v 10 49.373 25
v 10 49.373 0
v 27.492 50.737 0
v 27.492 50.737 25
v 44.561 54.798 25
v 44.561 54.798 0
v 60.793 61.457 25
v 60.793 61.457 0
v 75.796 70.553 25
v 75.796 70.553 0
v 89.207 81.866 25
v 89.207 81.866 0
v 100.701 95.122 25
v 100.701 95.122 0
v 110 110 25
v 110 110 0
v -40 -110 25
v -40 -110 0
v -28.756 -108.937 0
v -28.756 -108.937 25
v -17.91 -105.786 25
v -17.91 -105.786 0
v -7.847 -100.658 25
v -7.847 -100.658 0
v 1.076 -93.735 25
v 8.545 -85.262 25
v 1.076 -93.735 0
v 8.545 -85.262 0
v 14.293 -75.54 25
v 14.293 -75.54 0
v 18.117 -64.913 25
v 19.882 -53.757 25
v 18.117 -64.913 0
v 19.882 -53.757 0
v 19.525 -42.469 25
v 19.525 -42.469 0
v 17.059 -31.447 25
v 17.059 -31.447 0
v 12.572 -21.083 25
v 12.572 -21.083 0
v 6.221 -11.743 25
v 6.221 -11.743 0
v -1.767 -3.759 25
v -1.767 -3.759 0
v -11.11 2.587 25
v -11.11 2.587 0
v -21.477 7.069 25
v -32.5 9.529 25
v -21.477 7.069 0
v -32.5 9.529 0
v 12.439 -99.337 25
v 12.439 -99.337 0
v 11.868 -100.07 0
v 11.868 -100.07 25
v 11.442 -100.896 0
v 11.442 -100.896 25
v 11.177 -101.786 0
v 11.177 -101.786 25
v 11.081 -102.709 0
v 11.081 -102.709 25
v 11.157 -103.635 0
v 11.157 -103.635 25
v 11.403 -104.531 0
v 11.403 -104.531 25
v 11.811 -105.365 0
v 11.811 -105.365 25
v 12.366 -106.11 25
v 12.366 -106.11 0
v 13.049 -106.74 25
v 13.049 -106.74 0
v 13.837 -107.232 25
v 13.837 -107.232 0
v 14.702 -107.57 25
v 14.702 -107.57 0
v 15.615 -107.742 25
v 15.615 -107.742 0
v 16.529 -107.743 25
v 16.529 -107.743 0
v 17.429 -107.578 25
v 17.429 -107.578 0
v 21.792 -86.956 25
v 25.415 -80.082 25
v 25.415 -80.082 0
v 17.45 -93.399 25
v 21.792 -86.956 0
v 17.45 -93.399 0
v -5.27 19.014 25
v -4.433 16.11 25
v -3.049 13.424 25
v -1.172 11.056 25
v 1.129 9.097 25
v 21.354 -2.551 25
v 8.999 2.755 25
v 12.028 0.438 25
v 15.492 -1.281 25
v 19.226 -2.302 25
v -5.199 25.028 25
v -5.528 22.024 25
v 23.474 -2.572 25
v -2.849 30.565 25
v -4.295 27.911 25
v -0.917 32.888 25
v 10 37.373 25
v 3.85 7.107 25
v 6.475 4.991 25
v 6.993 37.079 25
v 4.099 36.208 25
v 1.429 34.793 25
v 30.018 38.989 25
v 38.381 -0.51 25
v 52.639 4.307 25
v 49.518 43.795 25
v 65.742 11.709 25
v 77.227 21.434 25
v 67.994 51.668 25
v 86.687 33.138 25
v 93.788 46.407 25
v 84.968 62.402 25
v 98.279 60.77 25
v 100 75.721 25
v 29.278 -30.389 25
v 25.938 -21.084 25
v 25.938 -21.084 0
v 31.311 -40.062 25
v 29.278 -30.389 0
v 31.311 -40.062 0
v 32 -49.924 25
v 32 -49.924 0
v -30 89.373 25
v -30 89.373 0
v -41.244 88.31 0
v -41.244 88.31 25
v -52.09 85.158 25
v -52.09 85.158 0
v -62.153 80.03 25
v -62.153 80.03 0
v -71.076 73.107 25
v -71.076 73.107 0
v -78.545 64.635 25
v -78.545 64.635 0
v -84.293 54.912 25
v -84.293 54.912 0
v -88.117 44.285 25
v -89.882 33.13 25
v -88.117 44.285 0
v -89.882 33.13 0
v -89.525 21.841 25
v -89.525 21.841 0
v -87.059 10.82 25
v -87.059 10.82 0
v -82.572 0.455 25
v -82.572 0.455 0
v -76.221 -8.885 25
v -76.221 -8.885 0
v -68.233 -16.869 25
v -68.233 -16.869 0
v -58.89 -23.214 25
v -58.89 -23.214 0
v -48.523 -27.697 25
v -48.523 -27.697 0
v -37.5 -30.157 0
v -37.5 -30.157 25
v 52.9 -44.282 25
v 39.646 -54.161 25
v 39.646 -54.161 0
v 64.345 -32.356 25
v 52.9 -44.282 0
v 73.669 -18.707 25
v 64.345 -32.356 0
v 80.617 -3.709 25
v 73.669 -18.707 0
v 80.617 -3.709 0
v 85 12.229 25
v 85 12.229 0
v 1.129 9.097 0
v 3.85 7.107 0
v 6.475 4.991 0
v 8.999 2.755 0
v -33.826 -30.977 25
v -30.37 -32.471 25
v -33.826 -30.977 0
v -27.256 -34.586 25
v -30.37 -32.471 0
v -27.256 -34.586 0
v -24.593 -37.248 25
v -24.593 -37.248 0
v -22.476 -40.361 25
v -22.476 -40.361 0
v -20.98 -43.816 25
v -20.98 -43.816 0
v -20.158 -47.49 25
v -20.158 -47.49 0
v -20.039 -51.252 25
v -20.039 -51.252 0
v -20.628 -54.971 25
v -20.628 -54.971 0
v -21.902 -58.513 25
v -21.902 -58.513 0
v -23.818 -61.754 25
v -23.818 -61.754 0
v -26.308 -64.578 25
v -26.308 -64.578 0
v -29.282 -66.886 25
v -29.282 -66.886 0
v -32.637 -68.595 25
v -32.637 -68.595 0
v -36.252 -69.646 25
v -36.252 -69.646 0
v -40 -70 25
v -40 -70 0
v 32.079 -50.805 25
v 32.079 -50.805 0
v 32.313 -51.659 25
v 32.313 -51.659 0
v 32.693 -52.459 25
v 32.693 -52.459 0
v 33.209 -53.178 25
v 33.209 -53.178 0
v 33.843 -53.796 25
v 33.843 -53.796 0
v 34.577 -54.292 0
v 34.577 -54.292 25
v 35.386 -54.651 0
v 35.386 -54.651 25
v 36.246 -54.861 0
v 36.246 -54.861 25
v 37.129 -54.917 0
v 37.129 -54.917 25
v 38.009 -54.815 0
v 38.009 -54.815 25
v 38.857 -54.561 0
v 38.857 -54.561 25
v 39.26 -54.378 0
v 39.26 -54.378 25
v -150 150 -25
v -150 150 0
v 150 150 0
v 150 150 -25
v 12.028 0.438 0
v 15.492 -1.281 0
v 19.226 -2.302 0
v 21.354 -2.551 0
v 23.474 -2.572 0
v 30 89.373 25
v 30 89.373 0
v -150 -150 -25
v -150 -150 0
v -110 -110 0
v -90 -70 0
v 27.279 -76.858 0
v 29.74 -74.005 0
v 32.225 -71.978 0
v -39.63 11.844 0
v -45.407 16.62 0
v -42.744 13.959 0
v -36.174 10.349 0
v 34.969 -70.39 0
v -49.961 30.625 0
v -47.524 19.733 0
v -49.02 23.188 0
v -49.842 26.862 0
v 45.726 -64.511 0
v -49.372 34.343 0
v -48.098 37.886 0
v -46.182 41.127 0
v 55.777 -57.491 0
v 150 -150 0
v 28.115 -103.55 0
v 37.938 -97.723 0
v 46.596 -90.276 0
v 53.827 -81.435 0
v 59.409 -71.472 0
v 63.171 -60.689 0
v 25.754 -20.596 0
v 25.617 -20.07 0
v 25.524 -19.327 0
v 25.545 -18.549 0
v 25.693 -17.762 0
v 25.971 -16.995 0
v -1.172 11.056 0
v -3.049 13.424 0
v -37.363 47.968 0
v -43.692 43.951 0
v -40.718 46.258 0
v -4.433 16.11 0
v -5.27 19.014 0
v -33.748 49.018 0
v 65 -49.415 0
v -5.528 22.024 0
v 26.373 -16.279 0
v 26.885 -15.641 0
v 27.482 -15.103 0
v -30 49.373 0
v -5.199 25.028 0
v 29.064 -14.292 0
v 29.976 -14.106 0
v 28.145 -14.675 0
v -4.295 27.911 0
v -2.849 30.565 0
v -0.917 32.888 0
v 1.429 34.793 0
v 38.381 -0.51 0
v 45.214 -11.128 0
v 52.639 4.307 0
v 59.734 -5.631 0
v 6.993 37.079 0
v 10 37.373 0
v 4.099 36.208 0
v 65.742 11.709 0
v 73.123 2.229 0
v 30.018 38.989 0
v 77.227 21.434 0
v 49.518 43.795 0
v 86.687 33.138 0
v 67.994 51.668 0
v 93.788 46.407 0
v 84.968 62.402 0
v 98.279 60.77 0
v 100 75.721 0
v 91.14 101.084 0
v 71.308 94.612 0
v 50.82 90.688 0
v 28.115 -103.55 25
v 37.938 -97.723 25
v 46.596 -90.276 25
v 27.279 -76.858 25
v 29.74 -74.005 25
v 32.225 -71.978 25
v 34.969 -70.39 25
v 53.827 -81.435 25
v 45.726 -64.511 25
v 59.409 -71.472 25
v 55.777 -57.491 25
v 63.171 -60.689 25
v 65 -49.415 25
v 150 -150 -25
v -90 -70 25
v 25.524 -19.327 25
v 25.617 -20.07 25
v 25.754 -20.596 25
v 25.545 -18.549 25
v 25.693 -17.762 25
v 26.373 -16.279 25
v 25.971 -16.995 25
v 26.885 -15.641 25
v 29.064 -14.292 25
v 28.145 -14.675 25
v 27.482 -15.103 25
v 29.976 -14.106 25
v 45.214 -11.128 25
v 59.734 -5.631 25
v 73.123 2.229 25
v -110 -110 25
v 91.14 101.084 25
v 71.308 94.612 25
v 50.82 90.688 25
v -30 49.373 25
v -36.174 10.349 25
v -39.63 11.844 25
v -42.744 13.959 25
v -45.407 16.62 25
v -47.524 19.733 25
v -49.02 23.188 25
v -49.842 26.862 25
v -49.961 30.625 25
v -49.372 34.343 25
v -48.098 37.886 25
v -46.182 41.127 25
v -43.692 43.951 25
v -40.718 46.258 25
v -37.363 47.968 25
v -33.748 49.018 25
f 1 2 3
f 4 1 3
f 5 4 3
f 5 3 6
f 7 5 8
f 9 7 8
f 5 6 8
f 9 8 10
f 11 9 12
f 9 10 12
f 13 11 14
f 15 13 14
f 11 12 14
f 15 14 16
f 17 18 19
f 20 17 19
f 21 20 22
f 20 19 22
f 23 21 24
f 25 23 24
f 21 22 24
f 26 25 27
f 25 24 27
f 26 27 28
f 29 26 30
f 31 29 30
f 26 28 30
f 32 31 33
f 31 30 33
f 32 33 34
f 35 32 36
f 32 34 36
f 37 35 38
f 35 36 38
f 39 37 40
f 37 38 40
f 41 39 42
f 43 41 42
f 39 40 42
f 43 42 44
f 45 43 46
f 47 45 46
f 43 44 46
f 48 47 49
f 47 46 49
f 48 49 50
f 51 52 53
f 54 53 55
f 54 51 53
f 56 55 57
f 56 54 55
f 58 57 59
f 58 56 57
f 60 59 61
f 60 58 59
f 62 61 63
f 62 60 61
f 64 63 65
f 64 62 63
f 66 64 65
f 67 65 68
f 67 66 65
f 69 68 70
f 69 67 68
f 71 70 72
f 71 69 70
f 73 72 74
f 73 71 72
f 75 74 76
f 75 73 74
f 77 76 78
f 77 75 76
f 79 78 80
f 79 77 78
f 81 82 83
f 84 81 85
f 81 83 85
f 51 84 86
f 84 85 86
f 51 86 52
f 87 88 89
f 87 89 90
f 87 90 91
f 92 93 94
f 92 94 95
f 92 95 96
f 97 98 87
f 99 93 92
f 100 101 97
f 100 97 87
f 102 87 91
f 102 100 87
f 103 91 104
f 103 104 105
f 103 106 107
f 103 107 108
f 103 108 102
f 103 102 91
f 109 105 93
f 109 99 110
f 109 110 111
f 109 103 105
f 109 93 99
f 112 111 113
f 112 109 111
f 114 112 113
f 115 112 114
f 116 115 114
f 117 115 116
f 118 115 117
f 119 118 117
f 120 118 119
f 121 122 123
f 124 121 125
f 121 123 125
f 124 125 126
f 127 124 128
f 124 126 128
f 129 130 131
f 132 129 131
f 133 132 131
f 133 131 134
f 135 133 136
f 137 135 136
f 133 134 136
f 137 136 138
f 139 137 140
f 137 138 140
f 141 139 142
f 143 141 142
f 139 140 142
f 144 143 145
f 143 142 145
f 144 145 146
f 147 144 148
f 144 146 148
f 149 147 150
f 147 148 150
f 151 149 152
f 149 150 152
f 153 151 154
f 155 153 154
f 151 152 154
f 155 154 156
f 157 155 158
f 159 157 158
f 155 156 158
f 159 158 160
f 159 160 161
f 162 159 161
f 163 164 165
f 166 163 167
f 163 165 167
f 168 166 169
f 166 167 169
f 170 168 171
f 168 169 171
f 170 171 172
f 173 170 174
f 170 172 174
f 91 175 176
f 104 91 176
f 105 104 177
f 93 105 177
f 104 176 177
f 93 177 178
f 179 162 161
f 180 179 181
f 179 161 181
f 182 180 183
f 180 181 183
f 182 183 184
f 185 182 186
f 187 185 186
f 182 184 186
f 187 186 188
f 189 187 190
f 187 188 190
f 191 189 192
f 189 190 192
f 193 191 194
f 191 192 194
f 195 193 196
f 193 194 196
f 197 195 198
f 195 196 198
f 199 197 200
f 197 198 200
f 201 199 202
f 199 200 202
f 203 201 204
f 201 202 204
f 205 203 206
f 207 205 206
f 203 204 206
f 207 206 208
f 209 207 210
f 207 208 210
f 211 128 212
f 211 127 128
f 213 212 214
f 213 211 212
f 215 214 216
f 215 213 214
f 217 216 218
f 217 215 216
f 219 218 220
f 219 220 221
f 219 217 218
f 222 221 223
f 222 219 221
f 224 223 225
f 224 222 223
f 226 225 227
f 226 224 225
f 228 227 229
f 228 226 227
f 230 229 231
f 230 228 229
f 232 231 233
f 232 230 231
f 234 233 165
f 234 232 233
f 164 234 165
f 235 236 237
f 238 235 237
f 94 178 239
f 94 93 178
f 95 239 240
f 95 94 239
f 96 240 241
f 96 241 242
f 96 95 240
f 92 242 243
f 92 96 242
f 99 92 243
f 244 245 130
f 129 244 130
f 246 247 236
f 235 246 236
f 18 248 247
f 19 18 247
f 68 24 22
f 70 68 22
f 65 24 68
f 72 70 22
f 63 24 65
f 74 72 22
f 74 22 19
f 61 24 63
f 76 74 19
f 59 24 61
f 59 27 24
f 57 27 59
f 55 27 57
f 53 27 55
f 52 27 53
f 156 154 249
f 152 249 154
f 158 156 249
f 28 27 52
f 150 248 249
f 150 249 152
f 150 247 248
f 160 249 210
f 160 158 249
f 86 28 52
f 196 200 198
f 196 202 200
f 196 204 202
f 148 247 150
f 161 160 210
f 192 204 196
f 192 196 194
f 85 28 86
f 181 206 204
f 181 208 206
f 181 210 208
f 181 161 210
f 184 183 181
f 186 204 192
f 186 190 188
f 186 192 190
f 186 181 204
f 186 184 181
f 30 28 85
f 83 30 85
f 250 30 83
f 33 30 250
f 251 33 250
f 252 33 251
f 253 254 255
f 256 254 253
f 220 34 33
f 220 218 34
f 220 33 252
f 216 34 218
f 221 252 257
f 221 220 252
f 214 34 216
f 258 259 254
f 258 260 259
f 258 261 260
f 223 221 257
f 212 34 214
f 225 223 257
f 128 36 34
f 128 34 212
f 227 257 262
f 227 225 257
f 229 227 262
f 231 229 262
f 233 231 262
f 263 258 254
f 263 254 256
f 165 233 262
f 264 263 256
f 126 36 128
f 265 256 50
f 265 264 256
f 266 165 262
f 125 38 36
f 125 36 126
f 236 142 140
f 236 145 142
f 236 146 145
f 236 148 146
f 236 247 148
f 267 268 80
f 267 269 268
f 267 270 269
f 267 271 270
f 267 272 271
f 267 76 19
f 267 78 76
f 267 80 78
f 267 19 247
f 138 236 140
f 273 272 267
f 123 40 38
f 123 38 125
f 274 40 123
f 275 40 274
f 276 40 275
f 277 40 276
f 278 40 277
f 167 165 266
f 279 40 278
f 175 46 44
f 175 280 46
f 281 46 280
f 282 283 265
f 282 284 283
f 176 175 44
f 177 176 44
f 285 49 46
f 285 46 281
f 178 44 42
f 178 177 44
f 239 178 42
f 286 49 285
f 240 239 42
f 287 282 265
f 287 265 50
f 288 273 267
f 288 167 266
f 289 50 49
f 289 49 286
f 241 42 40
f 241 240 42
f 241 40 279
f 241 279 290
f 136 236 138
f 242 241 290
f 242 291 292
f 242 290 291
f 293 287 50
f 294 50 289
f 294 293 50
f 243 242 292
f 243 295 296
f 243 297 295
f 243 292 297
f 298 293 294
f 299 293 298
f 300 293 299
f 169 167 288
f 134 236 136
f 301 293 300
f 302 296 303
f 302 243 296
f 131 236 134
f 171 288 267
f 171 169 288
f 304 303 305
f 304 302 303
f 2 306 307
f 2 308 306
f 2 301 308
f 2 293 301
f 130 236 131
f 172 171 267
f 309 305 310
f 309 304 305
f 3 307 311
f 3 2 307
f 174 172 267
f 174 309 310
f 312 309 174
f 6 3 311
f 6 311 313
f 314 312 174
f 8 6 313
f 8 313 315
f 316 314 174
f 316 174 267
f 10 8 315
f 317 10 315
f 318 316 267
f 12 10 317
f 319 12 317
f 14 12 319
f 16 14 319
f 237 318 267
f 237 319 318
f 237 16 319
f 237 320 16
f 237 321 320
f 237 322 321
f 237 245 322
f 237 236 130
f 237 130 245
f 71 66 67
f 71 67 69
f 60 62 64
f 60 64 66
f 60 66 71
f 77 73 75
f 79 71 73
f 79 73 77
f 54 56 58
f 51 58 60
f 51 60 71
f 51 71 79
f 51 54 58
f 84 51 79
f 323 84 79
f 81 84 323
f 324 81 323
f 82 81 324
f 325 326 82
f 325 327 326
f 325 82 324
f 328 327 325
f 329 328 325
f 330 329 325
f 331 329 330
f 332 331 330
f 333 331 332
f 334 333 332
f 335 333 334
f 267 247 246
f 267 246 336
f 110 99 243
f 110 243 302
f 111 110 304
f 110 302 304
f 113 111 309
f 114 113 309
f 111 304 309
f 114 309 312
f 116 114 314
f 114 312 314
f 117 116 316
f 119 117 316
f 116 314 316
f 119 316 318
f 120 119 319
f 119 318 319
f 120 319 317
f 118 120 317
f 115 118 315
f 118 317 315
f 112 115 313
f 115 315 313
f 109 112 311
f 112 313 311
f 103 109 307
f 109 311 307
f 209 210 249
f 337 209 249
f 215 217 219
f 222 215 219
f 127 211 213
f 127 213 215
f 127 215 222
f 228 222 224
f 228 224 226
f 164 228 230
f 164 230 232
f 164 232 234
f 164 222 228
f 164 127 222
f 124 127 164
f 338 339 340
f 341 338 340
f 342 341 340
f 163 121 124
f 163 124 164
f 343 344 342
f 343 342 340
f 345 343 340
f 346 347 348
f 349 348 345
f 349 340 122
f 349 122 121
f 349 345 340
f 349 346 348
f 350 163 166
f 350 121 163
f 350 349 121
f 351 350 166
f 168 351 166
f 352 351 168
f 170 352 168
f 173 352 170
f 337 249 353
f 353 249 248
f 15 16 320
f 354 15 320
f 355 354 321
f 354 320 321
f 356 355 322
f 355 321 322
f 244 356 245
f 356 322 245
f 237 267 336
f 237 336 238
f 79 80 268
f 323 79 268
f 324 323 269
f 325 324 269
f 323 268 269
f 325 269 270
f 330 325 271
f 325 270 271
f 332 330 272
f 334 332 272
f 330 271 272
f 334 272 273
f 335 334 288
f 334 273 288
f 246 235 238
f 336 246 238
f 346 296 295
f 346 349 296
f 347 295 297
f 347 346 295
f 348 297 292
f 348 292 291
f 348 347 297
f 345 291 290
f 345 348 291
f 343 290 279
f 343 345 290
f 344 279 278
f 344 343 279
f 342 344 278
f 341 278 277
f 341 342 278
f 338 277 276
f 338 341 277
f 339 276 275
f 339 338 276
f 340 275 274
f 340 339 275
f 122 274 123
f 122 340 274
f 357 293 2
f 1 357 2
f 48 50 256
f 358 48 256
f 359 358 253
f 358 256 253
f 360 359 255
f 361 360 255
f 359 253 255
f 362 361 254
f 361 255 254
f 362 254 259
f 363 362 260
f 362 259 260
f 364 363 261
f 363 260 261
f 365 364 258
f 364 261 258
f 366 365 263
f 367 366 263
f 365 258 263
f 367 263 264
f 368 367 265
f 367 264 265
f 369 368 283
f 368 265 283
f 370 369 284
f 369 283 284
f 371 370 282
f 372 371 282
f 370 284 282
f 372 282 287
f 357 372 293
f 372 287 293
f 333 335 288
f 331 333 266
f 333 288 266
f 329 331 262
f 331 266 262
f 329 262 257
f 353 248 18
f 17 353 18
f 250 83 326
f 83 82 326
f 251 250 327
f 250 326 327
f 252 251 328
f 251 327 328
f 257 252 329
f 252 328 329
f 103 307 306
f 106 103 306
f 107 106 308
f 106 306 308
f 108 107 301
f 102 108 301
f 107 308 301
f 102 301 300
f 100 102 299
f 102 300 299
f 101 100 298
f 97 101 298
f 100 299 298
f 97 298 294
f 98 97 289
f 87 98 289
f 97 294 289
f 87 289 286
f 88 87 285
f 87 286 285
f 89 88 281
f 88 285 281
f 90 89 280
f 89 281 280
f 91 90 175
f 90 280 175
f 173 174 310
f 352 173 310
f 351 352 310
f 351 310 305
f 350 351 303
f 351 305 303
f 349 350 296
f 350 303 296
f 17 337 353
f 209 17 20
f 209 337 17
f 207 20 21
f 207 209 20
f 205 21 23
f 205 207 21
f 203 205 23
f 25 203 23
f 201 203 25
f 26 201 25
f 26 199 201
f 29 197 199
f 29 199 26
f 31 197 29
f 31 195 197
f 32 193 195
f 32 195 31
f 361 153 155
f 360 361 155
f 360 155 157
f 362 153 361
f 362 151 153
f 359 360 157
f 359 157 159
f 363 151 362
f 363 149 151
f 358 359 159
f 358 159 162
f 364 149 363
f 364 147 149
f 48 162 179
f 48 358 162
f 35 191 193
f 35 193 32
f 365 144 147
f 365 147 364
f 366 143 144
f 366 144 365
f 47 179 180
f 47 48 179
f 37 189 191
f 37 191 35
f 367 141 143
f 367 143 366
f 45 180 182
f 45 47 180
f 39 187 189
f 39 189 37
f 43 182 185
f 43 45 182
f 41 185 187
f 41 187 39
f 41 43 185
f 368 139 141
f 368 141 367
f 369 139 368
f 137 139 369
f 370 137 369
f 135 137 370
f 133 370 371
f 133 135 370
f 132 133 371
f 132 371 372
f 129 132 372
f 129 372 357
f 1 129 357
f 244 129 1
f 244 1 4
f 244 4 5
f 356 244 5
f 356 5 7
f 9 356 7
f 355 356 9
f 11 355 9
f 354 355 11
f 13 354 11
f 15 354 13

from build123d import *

# Parameters (mm, degrees)
F0_W     = 300
F0_H     = 300
F1_DEPTH = 25
F3_DEPTH = 25
F4_R     = 20
F5_R     = 5


with BuildPart() as f1:
    # F0 (on Top) → F1 (new body)
    with BuildSketch(Plane.XY):
        Rectangle(F0_W, F0_H)
    extrude(amount=-F1_DEPTH)

    # F2 (on face) → F3 (join)
    with BuildSketch(Plane.XY):
        with BuildLine():
            ThreePointArc((-37.5, -30.156865), (-20.039255, -51.252458), (-40, -70))
            Line((-40, -70), (-90, -70))
            Line((-90, -70), (-110, -110))
            Line((-110, -110), (-40, -110))
            ThreePointArc((-40, -110), (19.882236, -53.757375), (-32.5, 9.529404))
            ThreePointArc((-32.5, 9.529404), (-49.960745, 30.624998), (-30, 49.372539))
            Line((-30, 49.372539), (10, 49.372539))
            ThreePointArc((10, 49.372539), (68.471551, 65.713145), (110, 110))
            ThreePointArc((110, 110), (71.308268, 94.61238), (30, 89.372539))
            Line((30, 89.372539), (-30, 89.372539))
            ThreePointArc((-30, 89.372539), (-89.882236, 33.129914), (-37.5, -30.156865))
        make_face()
        with BuildLine():
            ThreePointArc((100, 75.721052), (58.914743, 47.359298), (10, 37.372539))
            ThreePointArc((10, 37.372539), (-4.817424, 26.491687), (1.128978, 9.096592))
            ThreePointArc((1.128978, 9.096592), (7.932224, 3.726175), (14.040846, -2.422832))
            ThreePointArc((14.040846, -2.422832), (73.830182, 18.158186), (100, 75.721052))
        make_face()
        with BuildLine():
            ThreePointArc((85, 12.229434), (56.413934, -7.140348), (22.700465, -14.60718))
            ThreePointArc((22.700465, -14.60718), (30.620541, -35.973627), (31.466948, -58.745018))
            ThreePointArc((31.466948, -58.745018), (66.554074, -29.533671), (85, 12.229434))
        make_face()
        with BuildLine():
            ThreePointArc((28.093718, -73.39328), (16.967091, -94.031245), (-0.200503, -110))
            ThreePointArc((-0.200503, -110), (44.30119, -92.515885), (65, -49.415372))
            ThreePointArc((65, -49.415372), (47.736246, -63.235005), (28.093718, -73.39328))
        make_face()
    extrude(amount=F3_DEPTH)

    # F4
    f4_edges = [f1.edges().sort_by_distance(p)[0] for p in [
        (14.040846, -2.422832, 12.5),
        (28.093718, -73.39328, 12.5),
    ]]
    fillet(f4_edges, radius=F4_R)

    # F5
    f5_edges = [f1.edges().sort_by_distance(p)[0] for p in [
        (22.700465, -14.60718, 12.5),
        (31.466948, -58.745018, 12.5),
        (-0.200503, -110, 12.5),
    ]]
    fillet(f5_edges, radius=F5_R)


solid = f1.part
